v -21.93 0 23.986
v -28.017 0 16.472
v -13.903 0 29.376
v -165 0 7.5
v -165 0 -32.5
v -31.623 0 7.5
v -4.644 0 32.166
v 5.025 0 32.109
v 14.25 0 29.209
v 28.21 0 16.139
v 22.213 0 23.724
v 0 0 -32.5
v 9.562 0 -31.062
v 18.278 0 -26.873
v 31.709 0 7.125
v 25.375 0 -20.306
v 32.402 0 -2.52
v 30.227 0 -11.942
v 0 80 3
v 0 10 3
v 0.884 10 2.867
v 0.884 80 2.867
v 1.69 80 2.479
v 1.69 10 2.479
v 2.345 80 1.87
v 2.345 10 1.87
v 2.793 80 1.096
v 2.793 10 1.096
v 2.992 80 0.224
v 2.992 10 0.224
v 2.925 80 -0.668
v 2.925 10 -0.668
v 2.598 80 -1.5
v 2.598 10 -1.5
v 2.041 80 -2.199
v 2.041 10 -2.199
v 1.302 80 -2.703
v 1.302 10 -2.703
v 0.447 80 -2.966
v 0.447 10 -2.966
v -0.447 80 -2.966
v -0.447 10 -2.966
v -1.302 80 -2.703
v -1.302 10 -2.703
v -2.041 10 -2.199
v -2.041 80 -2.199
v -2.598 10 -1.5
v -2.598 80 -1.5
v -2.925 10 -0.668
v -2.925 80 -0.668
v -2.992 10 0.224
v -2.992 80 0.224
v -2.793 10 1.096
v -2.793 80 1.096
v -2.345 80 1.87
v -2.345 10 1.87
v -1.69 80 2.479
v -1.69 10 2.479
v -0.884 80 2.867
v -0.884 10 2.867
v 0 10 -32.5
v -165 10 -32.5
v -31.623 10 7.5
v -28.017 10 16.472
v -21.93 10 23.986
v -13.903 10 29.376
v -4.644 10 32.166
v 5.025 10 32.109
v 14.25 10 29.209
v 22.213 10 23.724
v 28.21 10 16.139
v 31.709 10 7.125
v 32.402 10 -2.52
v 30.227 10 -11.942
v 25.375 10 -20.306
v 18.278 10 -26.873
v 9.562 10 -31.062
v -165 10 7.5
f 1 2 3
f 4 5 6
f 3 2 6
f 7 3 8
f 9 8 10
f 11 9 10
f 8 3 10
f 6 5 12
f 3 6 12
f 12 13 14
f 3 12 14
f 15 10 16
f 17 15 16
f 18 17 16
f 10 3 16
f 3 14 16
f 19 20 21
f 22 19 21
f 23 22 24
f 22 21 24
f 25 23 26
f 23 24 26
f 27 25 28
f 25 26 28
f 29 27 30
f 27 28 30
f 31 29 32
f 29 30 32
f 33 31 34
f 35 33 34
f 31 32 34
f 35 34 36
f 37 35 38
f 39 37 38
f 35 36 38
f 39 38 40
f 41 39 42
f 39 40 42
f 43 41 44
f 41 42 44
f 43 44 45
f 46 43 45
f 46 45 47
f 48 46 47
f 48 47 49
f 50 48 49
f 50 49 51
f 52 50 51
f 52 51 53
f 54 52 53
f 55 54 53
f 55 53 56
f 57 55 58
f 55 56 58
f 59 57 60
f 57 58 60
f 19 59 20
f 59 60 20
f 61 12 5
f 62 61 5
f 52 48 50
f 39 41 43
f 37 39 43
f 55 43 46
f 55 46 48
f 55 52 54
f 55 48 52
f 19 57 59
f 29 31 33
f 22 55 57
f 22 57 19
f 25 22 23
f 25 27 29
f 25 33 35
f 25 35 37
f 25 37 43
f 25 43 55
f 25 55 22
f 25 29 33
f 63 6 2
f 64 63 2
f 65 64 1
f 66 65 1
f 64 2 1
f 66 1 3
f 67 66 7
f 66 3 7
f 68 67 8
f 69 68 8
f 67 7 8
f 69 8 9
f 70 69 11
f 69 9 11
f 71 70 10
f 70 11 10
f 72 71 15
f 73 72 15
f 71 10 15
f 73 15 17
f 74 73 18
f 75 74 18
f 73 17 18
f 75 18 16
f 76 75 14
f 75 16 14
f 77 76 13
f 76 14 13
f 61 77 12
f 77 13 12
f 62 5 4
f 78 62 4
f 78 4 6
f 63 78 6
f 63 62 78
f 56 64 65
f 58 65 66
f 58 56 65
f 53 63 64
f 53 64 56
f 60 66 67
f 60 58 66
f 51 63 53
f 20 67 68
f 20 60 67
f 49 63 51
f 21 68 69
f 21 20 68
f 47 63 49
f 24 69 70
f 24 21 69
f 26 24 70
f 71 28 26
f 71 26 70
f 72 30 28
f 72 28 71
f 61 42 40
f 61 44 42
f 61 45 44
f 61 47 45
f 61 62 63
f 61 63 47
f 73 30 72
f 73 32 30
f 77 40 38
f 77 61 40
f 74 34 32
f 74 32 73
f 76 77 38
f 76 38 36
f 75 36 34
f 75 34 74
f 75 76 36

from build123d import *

# Parameters (mm, degrees)
SKETCH1_R           = 32.5
BOSS_EXTRUDE1_DEPTH = 10
SKETCH2_R           = 3
BOSS_EXTRUDE2_DEPTH = 70


with BuildPart() as part:
    # Sketch1 → Boss-Extrude1 (new body)
    with BuildSketch(Plane(origin=(0, 0, 0), x_dir=(1, 0, 0), z_dir=(0, 1, 0))):
        with BuildLine():
            ThreePointArc((-31.622776602, -7.5), (-25.495097568, 20.155644371), (0, 32.5))
            Line((0, 32.5), (-165, 32.5))
            Line((-165, 32.5), (-165, -7.5))
            Line((-165, -7.5), (-31.622776602, -7.5))
        make_face()
        Circle(SKETCH1_R)
    extrude(amount=BOSS_EXTRUDE1_DEPTH)

    # Sketch2 → Boss-Extrude2 (add)
    with BuildSketch(Plane(origin=(0, 10, 0), x_dir=(1, 0, 0), z_dir=(0, 1, 0))):
        with Locations(Location((0, 0, 0), (0, 0, 270))):
            Circle(SKETCH2_R)
    extrude(amount=BOSS_EXTRUDE2_DEPTH)


solid = part.part
